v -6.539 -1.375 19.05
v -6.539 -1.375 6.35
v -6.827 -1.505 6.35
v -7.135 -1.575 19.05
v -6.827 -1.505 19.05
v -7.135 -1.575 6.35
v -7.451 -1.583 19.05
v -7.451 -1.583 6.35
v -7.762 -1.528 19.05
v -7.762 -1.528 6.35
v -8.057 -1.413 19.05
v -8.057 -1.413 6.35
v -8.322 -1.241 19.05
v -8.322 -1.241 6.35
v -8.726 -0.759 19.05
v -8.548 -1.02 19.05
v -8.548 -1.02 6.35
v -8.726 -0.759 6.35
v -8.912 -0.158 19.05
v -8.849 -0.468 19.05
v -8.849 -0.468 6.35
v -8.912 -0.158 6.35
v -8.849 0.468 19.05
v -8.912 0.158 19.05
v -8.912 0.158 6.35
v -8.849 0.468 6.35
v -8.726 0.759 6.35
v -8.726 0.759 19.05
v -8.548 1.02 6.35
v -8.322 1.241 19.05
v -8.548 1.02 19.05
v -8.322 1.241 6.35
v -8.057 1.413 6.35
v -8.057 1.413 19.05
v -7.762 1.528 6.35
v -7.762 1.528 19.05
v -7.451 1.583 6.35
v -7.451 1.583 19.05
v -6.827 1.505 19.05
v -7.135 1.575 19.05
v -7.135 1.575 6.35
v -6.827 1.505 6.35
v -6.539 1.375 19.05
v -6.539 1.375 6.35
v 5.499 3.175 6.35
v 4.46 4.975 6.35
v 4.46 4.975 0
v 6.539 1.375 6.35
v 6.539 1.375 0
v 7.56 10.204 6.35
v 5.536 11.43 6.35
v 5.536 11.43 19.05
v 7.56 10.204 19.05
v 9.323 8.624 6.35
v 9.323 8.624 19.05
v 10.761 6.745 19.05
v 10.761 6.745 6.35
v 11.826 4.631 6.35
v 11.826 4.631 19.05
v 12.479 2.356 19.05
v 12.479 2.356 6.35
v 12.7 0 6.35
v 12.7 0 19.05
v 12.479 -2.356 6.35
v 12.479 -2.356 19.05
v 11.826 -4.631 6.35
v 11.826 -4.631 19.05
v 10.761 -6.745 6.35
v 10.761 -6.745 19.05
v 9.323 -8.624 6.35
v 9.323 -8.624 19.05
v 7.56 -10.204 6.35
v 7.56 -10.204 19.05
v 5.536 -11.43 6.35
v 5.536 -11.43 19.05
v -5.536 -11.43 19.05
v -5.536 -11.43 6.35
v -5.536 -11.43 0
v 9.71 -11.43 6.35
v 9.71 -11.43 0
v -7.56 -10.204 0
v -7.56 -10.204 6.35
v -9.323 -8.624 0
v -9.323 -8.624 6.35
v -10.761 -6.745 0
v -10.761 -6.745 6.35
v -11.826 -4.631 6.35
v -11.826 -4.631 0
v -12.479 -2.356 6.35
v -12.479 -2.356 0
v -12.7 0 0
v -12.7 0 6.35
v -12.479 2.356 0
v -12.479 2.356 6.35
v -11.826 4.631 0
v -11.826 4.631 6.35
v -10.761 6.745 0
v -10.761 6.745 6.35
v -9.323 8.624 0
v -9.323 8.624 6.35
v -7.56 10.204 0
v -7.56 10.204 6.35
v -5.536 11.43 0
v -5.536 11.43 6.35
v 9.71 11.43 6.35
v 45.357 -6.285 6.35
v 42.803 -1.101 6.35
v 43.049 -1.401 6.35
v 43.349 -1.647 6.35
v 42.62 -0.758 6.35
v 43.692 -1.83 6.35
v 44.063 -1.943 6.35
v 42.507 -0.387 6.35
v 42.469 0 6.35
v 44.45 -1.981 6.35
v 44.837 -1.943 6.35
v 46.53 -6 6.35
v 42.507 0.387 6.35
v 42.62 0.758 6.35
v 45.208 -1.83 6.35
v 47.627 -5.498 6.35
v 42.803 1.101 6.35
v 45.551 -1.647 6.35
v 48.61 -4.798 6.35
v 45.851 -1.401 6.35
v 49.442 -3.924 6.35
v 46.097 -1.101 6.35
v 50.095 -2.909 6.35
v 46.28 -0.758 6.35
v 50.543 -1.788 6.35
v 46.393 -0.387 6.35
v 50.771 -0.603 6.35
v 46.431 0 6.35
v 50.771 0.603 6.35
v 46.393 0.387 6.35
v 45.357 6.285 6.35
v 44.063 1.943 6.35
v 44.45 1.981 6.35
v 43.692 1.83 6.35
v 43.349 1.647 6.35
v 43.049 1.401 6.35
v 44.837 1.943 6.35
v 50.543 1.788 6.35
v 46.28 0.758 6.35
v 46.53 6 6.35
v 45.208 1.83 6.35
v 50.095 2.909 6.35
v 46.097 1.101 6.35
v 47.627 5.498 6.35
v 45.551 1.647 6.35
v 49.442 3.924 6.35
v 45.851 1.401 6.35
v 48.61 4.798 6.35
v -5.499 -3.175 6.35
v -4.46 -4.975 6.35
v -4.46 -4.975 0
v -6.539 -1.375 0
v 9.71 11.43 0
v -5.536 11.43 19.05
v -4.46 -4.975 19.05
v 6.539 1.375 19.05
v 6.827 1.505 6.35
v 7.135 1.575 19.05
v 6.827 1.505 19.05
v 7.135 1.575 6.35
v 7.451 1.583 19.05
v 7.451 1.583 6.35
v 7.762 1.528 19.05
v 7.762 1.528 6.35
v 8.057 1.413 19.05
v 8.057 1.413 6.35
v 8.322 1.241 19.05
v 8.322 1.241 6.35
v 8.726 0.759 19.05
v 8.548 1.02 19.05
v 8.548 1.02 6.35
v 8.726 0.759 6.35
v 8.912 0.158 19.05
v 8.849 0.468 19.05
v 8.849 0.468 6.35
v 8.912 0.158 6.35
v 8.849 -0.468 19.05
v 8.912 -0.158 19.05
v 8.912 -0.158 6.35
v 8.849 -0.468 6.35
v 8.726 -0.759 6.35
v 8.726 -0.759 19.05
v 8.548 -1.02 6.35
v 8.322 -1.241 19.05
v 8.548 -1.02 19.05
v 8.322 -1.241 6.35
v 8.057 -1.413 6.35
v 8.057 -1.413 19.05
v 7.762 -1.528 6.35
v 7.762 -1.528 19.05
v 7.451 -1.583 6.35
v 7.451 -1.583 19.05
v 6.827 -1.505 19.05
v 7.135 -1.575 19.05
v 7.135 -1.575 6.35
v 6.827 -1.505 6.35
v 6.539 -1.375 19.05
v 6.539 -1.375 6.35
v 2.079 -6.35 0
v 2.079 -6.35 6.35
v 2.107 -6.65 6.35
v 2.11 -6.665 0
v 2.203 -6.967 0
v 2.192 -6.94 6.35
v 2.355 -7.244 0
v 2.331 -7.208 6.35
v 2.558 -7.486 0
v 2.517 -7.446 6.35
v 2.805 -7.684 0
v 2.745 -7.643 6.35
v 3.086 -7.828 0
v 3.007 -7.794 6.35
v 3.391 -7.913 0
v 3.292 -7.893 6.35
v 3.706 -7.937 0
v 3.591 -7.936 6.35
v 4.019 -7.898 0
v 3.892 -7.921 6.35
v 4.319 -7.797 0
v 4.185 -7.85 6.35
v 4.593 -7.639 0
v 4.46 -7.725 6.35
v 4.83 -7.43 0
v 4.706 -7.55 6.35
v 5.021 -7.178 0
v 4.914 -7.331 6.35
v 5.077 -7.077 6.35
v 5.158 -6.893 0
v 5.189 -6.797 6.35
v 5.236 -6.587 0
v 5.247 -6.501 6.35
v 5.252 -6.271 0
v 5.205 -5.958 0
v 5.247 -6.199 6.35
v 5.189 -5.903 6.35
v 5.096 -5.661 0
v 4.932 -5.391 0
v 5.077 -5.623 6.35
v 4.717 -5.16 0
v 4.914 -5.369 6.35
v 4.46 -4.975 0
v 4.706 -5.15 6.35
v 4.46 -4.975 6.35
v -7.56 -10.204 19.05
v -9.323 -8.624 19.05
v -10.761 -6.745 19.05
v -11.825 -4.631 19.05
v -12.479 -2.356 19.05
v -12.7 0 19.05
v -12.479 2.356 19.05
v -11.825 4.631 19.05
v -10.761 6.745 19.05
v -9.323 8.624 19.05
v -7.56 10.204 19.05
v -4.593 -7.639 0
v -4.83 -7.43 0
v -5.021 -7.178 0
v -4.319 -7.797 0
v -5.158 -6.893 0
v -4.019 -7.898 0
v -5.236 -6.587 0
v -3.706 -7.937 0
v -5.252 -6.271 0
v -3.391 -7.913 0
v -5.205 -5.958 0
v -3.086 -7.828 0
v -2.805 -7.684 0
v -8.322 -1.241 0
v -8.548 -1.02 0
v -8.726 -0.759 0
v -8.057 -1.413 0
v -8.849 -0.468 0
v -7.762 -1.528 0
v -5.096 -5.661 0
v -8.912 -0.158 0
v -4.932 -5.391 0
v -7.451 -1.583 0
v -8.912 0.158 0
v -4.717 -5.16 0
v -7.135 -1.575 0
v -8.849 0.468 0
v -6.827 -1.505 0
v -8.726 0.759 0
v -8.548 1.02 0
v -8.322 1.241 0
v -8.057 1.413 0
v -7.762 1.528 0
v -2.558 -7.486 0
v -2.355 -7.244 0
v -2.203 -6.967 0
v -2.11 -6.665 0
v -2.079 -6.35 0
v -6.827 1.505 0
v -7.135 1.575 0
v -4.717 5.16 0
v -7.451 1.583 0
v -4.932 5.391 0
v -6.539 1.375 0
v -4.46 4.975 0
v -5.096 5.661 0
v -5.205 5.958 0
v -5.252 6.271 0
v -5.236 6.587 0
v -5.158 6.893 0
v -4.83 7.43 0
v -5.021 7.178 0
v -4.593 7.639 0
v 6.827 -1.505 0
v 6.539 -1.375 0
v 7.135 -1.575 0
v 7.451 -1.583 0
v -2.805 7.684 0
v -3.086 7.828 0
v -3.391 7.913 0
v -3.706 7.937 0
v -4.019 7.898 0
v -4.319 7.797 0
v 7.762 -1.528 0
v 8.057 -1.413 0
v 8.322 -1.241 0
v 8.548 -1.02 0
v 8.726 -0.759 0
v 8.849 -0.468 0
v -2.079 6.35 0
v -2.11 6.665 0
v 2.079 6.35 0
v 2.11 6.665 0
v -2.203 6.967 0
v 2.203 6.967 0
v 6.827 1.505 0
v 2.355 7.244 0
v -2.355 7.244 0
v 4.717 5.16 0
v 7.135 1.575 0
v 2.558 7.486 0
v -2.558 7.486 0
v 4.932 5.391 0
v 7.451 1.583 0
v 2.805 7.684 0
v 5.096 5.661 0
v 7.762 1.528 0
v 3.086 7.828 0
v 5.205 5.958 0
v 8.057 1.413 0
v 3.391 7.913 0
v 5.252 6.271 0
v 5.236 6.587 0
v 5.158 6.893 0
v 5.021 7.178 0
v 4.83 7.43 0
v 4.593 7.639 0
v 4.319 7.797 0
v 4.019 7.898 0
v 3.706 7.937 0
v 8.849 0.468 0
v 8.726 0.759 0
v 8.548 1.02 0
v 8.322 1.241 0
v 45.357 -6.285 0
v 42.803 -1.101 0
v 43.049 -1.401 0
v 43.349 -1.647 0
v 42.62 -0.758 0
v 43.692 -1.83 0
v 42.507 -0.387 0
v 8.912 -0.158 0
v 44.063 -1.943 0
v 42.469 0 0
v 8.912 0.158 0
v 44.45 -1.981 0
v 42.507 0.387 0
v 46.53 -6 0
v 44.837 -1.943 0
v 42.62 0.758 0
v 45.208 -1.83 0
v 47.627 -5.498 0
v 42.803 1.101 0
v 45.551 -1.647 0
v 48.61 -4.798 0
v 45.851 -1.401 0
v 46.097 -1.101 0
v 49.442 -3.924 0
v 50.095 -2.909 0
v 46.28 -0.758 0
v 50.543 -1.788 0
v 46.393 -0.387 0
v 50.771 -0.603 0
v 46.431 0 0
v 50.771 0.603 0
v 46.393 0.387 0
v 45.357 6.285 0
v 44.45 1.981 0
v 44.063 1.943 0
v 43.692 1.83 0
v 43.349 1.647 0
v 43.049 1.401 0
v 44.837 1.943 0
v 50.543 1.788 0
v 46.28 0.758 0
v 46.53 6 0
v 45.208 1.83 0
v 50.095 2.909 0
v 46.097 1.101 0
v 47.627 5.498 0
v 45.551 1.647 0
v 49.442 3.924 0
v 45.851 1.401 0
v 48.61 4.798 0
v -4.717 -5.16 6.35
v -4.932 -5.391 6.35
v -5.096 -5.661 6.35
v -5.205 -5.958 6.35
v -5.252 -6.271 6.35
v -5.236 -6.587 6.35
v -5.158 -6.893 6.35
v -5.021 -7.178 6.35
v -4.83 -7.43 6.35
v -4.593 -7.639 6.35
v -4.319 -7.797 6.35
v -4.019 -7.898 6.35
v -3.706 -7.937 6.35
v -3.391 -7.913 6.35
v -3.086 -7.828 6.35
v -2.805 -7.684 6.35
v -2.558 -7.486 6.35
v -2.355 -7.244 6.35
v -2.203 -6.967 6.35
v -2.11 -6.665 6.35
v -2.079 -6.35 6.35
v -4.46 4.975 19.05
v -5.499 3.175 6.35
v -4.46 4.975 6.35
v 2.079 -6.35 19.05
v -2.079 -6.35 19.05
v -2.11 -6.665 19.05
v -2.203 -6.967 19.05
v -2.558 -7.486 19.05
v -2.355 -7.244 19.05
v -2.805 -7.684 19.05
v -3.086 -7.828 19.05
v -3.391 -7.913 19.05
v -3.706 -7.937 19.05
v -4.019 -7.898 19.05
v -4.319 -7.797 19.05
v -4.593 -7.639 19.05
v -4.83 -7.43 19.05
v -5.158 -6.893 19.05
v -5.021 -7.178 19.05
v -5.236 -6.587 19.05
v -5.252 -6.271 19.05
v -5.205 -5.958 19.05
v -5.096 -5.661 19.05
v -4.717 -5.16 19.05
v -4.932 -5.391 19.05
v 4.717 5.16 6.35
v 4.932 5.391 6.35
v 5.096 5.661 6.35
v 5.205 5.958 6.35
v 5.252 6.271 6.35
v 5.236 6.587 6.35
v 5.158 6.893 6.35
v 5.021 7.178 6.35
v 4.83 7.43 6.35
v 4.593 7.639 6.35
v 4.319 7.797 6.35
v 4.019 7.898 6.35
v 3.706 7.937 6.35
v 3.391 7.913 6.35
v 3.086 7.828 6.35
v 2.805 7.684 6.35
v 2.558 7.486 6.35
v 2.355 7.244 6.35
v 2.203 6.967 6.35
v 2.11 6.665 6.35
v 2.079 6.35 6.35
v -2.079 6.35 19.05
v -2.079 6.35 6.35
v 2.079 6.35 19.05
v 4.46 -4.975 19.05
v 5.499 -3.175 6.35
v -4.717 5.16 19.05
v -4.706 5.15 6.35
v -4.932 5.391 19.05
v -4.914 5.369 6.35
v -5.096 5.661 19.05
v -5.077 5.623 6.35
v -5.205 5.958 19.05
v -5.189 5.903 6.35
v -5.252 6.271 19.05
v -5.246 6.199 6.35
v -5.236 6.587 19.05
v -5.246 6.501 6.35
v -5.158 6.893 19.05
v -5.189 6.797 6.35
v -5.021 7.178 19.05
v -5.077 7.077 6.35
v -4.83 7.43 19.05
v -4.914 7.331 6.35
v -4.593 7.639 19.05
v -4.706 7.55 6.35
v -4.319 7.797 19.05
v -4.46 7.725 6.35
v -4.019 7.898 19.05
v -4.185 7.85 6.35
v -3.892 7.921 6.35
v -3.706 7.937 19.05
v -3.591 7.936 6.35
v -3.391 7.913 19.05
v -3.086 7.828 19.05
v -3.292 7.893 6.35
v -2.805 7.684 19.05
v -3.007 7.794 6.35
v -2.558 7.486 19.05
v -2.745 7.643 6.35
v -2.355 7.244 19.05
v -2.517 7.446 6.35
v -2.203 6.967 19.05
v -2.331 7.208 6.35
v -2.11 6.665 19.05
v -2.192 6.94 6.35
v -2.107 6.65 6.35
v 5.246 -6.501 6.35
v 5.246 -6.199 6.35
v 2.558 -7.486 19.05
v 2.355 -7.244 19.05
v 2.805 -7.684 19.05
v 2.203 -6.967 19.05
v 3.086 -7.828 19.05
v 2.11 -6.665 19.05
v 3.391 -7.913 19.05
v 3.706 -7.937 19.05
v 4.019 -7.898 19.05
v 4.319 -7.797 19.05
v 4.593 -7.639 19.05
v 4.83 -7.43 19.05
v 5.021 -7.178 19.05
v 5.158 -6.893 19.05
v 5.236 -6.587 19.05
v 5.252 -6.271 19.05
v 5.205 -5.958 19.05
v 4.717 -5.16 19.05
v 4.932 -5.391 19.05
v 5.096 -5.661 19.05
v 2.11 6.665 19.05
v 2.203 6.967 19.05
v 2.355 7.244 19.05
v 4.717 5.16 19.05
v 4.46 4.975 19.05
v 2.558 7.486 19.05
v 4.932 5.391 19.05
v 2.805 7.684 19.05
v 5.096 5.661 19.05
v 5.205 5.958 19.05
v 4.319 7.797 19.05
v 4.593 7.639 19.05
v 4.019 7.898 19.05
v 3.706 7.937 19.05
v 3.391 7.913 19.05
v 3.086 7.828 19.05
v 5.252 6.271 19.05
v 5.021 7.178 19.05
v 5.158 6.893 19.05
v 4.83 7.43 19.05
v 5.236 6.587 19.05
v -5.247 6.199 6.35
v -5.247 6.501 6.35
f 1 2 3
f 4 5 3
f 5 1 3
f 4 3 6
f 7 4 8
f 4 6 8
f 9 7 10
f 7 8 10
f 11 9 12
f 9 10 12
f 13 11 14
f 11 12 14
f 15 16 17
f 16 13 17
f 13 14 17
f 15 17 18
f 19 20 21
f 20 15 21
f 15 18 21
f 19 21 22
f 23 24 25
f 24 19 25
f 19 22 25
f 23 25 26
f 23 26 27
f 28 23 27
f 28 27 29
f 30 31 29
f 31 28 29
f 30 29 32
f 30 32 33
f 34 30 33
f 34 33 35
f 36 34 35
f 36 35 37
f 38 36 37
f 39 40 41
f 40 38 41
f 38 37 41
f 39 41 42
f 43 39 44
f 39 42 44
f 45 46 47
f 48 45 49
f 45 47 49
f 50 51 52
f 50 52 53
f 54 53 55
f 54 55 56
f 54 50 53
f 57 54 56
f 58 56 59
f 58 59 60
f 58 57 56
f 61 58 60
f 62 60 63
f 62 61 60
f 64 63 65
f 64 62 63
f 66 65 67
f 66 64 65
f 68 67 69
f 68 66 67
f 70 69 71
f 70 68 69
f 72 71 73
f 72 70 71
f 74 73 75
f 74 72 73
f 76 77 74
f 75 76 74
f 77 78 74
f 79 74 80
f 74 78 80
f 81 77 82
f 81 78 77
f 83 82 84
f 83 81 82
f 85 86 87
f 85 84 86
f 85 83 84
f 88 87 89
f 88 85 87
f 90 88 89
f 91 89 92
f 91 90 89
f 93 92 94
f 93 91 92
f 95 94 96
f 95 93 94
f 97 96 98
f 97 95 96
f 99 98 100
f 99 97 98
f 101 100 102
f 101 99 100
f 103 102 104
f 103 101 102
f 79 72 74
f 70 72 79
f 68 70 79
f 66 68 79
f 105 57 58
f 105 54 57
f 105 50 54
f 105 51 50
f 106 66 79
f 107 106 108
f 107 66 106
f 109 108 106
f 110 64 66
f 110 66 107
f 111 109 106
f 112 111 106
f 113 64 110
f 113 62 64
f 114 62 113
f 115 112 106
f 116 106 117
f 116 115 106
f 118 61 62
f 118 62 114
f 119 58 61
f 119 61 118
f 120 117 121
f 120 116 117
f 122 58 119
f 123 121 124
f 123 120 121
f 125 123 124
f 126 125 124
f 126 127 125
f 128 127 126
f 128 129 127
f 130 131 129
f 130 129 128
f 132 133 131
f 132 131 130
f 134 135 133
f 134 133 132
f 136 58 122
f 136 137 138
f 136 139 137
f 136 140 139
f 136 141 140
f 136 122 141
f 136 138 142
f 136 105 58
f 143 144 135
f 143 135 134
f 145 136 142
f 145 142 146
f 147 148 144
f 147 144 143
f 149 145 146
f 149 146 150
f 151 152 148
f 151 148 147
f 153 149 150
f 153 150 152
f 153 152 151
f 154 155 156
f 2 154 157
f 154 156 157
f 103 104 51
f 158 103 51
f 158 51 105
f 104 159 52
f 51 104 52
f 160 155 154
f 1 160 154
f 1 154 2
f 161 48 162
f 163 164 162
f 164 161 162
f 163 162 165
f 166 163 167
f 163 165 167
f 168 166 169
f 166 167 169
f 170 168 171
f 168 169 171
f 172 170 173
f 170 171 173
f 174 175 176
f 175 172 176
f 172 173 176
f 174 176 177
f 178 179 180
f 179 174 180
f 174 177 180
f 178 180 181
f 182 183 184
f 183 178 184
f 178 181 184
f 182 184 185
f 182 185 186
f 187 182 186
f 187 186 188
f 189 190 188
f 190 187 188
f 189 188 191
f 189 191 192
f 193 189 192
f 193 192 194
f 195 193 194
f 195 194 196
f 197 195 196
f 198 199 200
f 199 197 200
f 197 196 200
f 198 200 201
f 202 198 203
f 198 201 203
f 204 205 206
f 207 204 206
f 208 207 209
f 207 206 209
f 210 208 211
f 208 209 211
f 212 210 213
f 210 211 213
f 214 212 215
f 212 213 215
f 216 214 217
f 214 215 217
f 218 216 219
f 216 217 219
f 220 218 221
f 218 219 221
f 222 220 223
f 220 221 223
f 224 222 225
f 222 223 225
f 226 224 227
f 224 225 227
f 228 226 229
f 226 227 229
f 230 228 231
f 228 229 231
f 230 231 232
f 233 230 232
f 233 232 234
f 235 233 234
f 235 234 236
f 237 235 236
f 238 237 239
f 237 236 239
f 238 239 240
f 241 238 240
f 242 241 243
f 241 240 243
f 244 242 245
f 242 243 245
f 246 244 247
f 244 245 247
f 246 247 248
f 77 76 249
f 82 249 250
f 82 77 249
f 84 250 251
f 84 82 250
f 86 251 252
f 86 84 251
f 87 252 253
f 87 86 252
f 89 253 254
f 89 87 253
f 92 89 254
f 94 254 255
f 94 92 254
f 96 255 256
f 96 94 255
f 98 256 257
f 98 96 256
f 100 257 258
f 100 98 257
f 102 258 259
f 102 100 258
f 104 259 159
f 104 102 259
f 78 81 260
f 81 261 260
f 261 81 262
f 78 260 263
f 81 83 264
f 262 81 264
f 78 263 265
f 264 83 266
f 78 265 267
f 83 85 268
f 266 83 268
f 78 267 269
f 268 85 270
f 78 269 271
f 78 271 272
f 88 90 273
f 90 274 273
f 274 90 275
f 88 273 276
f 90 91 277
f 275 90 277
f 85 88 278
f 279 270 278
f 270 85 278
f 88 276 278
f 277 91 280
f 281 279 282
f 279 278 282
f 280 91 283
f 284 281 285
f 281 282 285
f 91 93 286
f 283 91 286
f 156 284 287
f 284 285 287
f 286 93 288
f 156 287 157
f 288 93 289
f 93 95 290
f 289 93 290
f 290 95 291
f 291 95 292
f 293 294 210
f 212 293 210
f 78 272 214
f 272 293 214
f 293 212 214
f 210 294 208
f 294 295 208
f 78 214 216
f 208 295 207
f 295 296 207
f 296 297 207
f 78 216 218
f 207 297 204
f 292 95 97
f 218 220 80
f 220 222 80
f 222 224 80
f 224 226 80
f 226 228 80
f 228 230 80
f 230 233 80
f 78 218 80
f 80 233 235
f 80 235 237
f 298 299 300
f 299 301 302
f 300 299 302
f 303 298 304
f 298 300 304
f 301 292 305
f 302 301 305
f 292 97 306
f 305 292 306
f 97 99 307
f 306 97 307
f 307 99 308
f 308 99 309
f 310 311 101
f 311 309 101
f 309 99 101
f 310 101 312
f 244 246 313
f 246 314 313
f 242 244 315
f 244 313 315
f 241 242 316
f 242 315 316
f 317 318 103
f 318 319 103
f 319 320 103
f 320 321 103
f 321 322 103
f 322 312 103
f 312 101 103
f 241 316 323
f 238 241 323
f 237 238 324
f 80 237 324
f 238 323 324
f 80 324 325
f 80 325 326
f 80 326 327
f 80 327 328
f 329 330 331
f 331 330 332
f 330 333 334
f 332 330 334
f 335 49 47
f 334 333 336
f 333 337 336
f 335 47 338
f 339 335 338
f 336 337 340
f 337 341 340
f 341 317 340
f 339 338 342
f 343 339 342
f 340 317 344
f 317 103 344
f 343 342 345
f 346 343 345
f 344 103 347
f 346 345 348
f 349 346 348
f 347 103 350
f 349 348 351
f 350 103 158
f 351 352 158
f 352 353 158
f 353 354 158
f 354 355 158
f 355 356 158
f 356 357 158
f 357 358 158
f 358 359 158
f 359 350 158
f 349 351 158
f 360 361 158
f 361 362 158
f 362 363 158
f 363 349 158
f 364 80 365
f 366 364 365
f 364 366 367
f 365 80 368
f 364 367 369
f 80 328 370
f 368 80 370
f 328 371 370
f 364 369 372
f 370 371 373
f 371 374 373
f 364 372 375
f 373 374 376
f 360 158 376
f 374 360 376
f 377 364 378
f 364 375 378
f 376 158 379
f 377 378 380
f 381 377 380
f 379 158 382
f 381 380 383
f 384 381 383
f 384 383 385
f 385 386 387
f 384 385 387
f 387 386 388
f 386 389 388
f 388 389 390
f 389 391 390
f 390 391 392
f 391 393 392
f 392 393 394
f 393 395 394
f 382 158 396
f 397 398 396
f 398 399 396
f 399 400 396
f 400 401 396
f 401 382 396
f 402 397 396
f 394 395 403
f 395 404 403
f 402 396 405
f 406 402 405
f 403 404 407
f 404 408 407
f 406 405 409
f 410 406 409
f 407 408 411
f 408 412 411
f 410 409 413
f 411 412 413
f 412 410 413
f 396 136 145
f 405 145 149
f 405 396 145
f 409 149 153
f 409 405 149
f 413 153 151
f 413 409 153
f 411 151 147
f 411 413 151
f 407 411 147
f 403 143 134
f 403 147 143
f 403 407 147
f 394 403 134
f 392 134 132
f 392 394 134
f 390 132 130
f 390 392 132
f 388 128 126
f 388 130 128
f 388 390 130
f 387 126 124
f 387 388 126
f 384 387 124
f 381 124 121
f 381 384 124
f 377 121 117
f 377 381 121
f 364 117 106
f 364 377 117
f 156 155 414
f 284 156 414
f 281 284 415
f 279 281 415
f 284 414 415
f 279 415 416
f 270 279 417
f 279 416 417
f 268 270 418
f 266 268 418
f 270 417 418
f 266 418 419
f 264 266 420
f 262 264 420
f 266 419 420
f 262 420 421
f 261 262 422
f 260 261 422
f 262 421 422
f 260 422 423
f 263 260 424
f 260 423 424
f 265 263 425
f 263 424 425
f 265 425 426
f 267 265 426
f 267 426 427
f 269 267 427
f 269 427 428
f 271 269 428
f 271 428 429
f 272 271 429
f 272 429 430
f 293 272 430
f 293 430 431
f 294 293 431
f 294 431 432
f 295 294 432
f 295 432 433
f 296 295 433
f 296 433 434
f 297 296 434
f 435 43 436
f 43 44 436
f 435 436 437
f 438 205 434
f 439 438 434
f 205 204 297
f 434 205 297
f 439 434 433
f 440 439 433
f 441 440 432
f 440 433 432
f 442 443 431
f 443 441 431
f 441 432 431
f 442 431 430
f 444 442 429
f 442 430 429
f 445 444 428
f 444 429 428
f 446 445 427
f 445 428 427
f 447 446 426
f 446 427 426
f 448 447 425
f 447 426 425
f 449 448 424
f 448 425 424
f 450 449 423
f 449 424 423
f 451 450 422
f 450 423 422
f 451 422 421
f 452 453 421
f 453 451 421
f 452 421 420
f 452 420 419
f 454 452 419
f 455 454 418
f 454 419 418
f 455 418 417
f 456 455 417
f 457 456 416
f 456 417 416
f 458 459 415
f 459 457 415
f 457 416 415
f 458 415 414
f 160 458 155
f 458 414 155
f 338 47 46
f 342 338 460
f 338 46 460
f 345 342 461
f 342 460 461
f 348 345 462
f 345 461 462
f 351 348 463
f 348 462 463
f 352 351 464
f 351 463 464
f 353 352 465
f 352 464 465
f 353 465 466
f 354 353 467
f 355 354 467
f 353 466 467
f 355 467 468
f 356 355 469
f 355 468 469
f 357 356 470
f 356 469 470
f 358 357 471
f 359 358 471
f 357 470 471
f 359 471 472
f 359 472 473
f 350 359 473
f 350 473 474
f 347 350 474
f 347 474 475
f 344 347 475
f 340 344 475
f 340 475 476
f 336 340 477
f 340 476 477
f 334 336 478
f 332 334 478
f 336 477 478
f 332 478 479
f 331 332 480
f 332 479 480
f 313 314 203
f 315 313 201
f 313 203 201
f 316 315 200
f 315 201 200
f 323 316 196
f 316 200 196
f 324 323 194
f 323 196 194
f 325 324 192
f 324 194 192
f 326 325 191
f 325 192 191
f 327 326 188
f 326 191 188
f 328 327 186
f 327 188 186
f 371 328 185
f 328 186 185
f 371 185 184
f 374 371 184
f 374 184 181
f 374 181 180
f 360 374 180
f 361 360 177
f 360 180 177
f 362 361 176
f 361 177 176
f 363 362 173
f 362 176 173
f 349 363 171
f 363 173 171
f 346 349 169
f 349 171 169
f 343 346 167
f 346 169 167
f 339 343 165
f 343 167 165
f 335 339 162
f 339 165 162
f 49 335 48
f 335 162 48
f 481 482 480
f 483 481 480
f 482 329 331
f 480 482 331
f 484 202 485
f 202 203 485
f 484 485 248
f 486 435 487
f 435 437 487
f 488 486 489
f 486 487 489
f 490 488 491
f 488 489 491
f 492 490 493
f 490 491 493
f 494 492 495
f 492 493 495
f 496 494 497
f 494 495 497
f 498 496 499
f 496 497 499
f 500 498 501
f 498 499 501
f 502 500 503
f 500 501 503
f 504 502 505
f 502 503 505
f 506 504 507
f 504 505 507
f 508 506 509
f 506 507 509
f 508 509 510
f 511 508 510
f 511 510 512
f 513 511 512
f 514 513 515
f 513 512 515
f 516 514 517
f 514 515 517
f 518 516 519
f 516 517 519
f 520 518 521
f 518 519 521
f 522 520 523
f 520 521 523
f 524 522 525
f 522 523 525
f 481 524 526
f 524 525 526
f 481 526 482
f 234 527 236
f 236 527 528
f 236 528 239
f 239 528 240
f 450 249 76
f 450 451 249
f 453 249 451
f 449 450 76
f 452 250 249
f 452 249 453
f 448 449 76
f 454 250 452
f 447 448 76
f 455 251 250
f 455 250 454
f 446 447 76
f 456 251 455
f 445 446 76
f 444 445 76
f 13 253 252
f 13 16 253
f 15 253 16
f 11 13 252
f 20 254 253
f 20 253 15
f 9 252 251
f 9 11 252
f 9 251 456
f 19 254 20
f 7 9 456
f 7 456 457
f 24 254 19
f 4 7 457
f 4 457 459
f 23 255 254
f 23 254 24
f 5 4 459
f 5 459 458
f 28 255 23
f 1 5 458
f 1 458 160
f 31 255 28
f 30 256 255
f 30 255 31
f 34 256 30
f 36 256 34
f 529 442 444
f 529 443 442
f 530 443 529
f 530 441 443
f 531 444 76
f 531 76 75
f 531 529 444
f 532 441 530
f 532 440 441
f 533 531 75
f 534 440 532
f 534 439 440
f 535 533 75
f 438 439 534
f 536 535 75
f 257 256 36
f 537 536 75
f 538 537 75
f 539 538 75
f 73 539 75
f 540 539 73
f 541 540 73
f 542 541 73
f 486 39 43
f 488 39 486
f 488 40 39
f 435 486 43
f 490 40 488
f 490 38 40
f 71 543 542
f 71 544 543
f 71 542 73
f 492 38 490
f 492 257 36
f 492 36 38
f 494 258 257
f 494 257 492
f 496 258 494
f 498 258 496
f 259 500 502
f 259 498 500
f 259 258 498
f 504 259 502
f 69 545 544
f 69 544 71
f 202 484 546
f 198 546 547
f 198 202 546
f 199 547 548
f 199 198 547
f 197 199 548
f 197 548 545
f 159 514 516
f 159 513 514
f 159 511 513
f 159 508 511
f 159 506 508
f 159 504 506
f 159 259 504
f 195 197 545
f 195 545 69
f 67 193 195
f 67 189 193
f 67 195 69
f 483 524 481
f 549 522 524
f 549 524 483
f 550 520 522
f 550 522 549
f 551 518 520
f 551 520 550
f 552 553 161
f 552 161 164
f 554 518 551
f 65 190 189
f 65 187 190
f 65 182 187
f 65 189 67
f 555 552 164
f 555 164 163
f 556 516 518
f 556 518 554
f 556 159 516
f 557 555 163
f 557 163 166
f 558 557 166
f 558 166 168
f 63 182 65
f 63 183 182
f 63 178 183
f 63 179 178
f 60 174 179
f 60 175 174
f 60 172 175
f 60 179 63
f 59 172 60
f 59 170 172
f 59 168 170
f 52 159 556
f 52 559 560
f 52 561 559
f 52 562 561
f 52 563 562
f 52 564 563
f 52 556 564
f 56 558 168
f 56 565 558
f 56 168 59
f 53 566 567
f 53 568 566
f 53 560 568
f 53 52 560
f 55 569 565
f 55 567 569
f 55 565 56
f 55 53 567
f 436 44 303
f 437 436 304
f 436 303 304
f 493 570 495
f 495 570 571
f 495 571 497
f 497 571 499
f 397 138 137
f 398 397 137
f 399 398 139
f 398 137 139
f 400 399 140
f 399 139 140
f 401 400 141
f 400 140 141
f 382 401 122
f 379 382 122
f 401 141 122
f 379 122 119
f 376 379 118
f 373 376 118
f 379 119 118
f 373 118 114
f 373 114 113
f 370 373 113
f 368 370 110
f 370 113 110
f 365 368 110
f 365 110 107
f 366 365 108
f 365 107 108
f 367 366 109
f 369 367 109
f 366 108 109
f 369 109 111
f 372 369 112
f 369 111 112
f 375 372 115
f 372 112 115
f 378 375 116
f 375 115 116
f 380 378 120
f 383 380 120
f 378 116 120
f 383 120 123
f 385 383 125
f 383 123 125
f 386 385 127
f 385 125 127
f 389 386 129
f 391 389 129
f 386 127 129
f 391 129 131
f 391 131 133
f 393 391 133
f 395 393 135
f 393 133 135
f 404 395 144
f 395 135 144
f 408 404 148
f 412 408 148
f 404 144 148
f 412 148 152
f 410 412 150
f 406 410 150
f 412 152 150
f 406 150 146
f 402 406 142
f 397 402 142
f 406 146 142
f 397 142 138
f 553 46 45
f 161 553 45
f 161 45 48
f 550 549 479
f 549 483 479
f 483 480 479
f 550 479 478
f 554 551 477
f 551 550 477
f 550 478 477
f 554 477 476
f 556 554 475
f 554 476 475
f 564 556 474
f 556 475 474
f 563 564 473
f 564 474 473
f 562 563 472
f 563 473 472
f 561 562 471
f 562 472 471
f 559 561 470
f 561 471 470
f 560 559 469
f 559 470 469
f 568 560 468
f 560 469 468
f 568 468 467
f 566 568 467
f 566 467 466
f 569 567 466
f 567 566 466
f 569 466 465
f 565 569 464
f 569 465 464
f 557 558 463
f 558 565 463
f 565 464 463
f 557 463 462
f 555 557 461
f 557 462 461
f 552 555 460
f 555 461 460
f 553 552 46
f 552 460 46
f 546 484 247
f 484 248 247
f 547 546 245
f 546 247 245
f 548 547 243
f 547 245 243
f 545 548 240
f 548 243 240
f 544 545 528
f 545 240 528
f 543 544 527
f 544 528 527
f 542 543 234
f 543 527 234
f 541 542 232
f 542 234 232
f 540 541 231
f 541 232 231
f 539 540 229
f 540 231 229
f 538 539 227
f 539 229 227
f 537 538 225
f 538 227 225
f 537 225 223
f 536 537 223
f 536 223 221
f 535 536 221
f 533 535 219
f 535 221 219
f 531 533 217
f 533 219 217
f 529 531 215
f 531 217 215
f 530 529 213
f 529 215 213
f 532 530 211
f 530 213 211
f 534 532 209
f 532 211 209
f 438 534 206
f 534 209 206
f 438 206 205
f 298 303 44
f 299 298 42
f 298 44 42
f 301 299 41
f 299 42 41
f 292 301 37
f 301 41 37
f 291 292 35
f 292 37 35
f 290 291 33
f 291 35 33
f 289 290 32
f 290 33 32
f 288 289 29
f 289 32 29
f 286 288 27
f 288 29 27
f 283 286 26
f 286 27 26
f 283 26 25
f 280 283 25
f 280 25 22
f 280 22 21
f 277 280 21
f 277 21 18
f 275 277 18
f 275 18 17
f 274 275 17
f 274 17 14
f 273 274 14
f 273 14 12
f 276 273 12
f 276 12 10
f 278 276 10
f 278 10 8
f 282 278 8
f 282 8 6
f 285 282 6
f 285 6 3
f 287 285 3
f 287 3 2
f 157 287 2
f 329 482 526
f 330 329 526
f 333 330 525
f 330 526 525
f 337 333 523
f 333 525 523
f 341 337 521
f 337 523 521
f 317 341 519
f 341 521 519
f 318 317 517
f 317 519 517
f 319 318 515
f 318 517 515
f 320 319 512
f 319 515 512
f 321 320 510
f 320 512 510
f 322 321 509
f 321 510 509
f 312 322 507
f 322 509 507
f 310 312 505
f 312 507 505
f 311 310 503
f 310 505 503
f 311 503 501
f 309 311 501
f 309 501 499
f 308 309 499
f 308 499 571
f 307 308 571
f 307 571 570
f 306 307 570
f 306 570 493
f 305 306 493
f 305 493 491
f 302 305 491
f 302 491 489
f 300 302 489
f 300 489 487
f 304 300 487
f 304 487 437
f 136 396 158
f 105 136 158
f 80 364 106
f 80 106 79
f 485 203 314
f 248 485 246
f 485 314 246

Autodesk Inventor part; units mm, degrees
ref_plane "YZ Plane" through (0, 0, 0) normal (1, 0, 0) x (0, 1, 0)
sketch "Sketch1" plane through (0, 0, 0) normal (0, 0, 1) x (1, 0, 0)
  line L0 (7.3323, 0) -> (3.6662, -6.35)
  line L1 (3.6662, -6.35) -> (-3.6662, -6.35)
  line L2 (-3.6662, -6.35) -> (-7.3323, 0)
  line L3 (-7.3323, 0) -> (-3.6662, 6.35)
  line L4 (-3.6662, 6.35) -> (3.6662, 6.35)
  line L5 (3.6662, 6.35) -> (7.3323, 0)
  circle A0 centre (0, 0) radius 12.7
  circle A1 centre (44.45, 0) radius 6.35
  line L6 (45.3571, 6.2849) -> (1.8143, 12.5697)
  line L7 (45.3571, -6.2849) -> (1.8143, -12.5697)
  line L8 (0, 0) -> (64.5311, 0) construction
  dimension "d0" = 12.7
  dimension "d1" = 25.4
  dimension "d2" = 44.45
  dimension "d3" = 12.7
extrude "Extrusion1" add sketch "Sketch1" along normal blind 6.35
hole "Hole1" at (44.45, 0, 0) direction (0, 0, 1) diameter 3.9624 depth 13.6144 thread size "10-32 UNF" class "2B" standard "ANSI Unified Screw Threads"
hole "Hole2" at (3.6662, -6.35, 0) at (7.3323, 0, 0) at (3.6662, 6.35, 0) at (-3.6662, 6.35, 0) at (-7.3323, 0, 0) at (-3.6662, -6.35, 0) direction (0, 0, 1) diameter 3.175 depth 13.6144
sketch "Sketch2" plane through (0, 0, 6.35) normal (0, 0, 1) x (1, 0, 0)
  arc A0 (1.8143, 12.5697) -> (1.8143, -12.5697) centre (0, 0) ccw projected
  circle A1 centre (0, 0) radius 12.7
  line L0 (-2.0787, 6.35) -> (2.0787, 6.35) projected
  arc A2 (4.4599, 4.9752) -> (2.0787, 6.35) centre (3.6662, 6.35) ccw projected
  arc A3 (-2.0787, 6.35) -> (-4.4599, 4.9752) centre (-3.6662, 6.35) ccw projected
  line L1 (-6.5386, 1.3748) -> (-4.4599, 4.9752) projected
  arc A4 (-6.5386, 1.3748) -> (-6.5386, -1.3748) centre (-7.3323, 0) ccw projected
  line L2 (-4.4599, -4.9752) -> (-6.5386, -1.3748) projected
  arc A5 (-4.4599, -4.9752) -> (-2.0787, -6.35) centre (-3.6662, -6.35) ccw projected
  line L3 (2.0787, -6.35) -> (-2.0787, -6.35) projected
  arc A6 (2.0787, -6.35) -> (4.4599, -4.9752) centre (3.6662, -6.35) ccw projected
  line L4 (6.5386, -1.3748) -> (4.4599, -4.9752) projected
  arc A7 (6.5386, -1.3748) -> (6.5386, 1.3748) centre (7.3323, 0) ccw projected
  line L5 (4.4599, 4.9752) -> (6.5386, 1.3748) projected
  point P0 (1.8143, -12.5697)
extrude "Extrusion2" add sketch "Sketch2" along normal blind 12.7
chamfer "Chamfer1" [suppressed]
ref_plane "Work Plane1" through (-2.0787, -11.43, 0) normal (0, 1, 0) x (1, 0, 0)
sketch "Sketch3" plane through (-2.0787, -11.43, 0) normal (0, 1, 0) x (1, 0, 0)
  line L0 (-10.6213, 0) -> (3.893, 0) projected
  line L1 (-10.6213, -19.05) -> (14.7787, -19.05) projected
  line L2 (-10.6213, 0) -> (14.7787, 0)
  line L3 (14.7787, 0) -> (14.7787, -19.05)
  line L4 (14.7787, -19.05) -> (-10.6213, -19.05)
  line L5 (-10.6213, -19.05) -> (-10.6213, 0)
  point P0 (2.0787, 0)
  point P1 (-10.6213, -19.05)
extrude "Extrusion3" cut sketch "Sketch3" against normal through all
ref_plane "Work Plane2" through (-2.0787, 11.43, 0) normal (0, -1, 0) x (1, 0, 0)
sketch "Sketch4" plane through (-2.0787, 11.43, 0) normal (0, -1, 0) x (1, 0, 0)
  line L0 (3.893, 0) -> (-10.6213, 0) projected
  line L1 (14.7787, 19.05) -> (-10.6213, 19.05) projected
  line L2 (-10.6213, 0) -> (14.7787, 0)
  line L3 (14.7787, 0) -> (14.7787, 19.05)
  line L4 (14.7787, 19.05) -> (-10.6213, 19.05)
  line L5 (-10.6213, 19.05) -> (-10.6213, 0)
  point P0 (2.0787, 0)
  point P1 (-3.4571, 0)
  point P2 (7.6145, 19.05)
  point P3 (-3.4571, 19.05)
  point P4 (-10.6213, 19.05)
extrude "Extrusion4" cut sketch "Sketch4" against normal through all
properties part number "Lower Linkage"
